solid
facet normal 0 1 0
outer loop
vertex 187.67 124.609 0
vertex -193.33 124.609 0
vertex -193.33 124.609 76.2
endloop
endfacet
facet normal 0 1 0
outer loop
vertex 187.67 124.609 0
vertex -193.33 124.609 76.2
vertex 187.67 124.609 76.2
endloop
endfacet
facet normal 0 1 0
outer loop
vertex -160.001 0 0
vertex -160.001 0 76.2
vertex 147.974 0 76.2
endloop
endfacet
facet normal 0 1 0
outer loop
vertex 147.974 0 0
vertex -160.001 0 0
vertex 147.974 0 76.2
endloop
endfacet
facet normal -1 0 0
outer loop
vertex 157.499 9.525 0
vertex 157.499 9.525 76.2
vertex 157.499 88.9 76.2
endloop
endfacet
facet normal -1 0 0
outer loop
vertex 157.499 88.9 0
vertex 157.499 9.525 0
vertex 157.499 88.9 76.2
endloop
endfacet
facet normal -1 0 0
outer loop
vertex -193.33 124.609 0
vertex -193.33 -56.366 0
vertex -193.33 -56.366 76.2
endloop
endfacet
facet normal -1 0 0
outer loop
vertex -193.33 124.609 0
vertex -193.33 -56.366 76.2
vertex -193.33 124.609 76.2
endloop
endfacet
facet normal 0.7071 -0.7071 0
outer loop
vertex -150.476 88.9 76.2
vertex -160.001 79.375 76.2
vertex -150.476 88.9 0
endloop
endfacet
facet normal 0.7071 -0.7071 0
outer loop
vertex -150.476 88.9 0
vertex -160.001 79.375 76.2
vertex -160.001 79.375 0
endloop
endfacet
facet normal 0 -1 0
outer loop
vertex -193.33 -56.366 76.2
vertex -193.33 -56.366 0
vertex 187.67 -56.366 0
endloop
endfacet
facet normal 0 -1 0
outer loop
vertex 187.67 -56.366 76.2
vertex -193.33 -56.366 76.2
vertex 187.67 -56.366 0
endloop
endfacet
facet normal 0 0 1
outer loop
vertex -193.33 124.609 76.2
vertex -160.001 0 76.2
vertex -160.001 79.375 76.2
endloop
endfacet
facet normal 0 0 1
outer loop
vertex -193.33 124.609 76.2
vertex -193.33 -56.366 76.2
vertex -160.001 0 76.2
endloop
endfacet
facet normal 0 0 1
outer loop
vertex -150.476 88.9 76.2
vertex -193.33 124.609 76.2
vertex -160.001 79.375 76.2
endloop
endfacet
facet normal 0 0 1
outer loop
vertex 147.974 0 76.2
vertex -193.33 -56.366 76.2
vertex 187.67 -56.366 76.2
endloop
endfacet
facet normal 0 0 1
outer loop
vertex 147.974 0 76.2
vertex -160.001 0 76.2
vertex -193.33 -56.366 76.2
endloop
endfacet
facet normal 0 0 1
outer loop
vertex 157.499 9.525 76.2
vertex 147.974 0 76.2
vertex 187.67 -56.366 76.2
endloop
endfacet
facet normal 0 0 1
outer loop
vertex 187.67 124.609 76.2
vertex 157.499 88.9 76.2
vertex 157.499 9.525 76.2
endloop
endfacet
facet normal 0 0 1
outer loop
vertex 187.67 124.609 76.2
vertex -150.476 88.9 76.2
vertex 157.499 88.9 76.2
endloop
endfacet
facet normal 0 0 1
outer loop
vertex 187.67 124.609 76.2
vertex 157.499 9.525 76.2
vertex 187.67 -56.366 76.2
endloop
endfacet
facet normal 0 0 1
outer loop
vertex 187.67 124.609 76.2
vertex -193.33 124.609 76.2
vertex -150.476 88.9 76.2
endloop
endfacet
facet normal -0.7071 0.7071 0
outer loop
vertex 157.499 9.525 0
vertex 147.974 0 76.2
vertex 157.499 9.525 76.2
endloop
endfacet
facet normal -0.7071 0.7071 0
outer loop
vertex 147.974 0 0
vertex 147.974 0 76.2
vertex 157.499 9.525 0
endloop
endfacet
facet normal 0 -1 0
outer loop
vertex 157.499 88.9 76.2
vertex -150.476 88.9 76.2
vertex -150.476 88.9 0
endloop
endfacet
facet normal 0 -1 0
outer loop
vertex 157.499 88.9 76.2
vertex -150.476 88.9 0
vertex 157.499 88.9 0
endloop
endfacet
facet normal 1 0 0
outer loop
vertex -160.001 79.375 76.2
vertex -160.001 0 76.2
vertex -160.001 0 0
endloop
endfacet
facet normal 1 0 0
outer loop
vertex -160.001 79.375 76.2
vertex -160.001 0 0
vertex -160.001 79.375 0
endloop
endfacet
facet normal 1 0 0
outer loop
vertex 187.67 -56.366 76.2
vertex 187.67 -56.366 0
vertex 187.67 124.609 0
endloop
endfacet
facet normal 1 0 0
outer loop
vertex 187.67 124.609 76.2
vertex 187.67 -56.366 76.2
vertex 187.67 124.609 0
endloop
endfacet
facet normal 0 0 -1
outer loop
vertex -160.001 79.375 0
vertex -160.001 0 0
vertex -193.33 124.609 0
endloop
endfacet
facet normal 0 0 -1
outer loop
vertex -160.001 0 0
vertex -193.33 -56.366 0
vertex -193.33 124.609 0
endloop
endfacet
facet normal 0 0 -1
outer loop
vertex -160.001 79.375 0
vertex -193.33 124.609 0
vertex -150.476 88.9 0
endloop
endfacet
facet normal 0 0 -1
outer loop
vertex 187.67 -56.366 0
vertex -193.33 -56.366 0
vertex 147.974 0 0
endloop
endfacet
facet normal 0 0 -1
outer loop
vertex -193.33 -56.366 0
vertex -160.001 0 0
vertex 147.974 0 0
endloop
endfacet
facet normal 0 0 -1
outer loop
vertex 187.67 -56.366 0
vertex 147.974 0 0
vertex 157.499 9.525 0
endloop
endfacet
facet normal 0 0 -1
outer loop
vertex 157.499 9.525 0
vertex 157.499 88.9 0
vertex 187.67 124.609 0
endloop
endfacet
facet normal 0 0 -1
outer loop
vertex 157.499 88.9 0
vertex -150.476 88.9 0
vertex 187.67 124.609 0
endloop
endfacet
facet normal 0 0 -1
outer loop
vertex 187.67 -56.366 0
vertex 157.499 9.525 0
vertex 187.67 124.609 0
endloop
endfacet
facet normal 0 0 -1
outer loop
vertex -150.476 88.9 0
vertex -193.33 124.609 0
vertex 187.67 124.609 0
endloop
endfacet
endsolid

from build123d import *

# Parameters (mm, degrees)
F0_W     = 381
F0_H     = 180.975
F1_DEPTH = 76.2
F2_W     = 317.5
F2_H     = 88.9
F3_DEPTH = 76.2
F4_SIZE  = 9.525
F5_SIZE  = 9.525


with BuildPart() as f1:
    # F0 (on Top) → F1 (new body)
    with BuildSketch(Plane.XY):
        with Locations((-2.829934, 34.121945)):
            Rectangle(F0_W, F0_H)
    extrude(amount=F1_DEPTH)

    # F2 (on face) → F3 (cut)
    with BuildSketch(Plane.XY.offset(76.2)):
        with Locations((-1.251158, 44.45)):
            Rectangle(F2_W, F2_H)
    extrude(amount=-F3_DEPTH, mode=Mode.SUBTRACT)

    # F4
    f4_edges = [f1.edges().sort_by_distance(p)[0] for p in [
        (-160.001158, 88.9, 38.1),
    ]]
    chamfer(f4_edges, length=F4_SIZE)

    # F5
    f5_edges = [f1.edges().sort_by_distance(p)[0] for p in [
        (157.498842, 0, 38.1),
    ]]
    chamfer(f5_edges, length=F5_SIZE)


solid = f1.part
